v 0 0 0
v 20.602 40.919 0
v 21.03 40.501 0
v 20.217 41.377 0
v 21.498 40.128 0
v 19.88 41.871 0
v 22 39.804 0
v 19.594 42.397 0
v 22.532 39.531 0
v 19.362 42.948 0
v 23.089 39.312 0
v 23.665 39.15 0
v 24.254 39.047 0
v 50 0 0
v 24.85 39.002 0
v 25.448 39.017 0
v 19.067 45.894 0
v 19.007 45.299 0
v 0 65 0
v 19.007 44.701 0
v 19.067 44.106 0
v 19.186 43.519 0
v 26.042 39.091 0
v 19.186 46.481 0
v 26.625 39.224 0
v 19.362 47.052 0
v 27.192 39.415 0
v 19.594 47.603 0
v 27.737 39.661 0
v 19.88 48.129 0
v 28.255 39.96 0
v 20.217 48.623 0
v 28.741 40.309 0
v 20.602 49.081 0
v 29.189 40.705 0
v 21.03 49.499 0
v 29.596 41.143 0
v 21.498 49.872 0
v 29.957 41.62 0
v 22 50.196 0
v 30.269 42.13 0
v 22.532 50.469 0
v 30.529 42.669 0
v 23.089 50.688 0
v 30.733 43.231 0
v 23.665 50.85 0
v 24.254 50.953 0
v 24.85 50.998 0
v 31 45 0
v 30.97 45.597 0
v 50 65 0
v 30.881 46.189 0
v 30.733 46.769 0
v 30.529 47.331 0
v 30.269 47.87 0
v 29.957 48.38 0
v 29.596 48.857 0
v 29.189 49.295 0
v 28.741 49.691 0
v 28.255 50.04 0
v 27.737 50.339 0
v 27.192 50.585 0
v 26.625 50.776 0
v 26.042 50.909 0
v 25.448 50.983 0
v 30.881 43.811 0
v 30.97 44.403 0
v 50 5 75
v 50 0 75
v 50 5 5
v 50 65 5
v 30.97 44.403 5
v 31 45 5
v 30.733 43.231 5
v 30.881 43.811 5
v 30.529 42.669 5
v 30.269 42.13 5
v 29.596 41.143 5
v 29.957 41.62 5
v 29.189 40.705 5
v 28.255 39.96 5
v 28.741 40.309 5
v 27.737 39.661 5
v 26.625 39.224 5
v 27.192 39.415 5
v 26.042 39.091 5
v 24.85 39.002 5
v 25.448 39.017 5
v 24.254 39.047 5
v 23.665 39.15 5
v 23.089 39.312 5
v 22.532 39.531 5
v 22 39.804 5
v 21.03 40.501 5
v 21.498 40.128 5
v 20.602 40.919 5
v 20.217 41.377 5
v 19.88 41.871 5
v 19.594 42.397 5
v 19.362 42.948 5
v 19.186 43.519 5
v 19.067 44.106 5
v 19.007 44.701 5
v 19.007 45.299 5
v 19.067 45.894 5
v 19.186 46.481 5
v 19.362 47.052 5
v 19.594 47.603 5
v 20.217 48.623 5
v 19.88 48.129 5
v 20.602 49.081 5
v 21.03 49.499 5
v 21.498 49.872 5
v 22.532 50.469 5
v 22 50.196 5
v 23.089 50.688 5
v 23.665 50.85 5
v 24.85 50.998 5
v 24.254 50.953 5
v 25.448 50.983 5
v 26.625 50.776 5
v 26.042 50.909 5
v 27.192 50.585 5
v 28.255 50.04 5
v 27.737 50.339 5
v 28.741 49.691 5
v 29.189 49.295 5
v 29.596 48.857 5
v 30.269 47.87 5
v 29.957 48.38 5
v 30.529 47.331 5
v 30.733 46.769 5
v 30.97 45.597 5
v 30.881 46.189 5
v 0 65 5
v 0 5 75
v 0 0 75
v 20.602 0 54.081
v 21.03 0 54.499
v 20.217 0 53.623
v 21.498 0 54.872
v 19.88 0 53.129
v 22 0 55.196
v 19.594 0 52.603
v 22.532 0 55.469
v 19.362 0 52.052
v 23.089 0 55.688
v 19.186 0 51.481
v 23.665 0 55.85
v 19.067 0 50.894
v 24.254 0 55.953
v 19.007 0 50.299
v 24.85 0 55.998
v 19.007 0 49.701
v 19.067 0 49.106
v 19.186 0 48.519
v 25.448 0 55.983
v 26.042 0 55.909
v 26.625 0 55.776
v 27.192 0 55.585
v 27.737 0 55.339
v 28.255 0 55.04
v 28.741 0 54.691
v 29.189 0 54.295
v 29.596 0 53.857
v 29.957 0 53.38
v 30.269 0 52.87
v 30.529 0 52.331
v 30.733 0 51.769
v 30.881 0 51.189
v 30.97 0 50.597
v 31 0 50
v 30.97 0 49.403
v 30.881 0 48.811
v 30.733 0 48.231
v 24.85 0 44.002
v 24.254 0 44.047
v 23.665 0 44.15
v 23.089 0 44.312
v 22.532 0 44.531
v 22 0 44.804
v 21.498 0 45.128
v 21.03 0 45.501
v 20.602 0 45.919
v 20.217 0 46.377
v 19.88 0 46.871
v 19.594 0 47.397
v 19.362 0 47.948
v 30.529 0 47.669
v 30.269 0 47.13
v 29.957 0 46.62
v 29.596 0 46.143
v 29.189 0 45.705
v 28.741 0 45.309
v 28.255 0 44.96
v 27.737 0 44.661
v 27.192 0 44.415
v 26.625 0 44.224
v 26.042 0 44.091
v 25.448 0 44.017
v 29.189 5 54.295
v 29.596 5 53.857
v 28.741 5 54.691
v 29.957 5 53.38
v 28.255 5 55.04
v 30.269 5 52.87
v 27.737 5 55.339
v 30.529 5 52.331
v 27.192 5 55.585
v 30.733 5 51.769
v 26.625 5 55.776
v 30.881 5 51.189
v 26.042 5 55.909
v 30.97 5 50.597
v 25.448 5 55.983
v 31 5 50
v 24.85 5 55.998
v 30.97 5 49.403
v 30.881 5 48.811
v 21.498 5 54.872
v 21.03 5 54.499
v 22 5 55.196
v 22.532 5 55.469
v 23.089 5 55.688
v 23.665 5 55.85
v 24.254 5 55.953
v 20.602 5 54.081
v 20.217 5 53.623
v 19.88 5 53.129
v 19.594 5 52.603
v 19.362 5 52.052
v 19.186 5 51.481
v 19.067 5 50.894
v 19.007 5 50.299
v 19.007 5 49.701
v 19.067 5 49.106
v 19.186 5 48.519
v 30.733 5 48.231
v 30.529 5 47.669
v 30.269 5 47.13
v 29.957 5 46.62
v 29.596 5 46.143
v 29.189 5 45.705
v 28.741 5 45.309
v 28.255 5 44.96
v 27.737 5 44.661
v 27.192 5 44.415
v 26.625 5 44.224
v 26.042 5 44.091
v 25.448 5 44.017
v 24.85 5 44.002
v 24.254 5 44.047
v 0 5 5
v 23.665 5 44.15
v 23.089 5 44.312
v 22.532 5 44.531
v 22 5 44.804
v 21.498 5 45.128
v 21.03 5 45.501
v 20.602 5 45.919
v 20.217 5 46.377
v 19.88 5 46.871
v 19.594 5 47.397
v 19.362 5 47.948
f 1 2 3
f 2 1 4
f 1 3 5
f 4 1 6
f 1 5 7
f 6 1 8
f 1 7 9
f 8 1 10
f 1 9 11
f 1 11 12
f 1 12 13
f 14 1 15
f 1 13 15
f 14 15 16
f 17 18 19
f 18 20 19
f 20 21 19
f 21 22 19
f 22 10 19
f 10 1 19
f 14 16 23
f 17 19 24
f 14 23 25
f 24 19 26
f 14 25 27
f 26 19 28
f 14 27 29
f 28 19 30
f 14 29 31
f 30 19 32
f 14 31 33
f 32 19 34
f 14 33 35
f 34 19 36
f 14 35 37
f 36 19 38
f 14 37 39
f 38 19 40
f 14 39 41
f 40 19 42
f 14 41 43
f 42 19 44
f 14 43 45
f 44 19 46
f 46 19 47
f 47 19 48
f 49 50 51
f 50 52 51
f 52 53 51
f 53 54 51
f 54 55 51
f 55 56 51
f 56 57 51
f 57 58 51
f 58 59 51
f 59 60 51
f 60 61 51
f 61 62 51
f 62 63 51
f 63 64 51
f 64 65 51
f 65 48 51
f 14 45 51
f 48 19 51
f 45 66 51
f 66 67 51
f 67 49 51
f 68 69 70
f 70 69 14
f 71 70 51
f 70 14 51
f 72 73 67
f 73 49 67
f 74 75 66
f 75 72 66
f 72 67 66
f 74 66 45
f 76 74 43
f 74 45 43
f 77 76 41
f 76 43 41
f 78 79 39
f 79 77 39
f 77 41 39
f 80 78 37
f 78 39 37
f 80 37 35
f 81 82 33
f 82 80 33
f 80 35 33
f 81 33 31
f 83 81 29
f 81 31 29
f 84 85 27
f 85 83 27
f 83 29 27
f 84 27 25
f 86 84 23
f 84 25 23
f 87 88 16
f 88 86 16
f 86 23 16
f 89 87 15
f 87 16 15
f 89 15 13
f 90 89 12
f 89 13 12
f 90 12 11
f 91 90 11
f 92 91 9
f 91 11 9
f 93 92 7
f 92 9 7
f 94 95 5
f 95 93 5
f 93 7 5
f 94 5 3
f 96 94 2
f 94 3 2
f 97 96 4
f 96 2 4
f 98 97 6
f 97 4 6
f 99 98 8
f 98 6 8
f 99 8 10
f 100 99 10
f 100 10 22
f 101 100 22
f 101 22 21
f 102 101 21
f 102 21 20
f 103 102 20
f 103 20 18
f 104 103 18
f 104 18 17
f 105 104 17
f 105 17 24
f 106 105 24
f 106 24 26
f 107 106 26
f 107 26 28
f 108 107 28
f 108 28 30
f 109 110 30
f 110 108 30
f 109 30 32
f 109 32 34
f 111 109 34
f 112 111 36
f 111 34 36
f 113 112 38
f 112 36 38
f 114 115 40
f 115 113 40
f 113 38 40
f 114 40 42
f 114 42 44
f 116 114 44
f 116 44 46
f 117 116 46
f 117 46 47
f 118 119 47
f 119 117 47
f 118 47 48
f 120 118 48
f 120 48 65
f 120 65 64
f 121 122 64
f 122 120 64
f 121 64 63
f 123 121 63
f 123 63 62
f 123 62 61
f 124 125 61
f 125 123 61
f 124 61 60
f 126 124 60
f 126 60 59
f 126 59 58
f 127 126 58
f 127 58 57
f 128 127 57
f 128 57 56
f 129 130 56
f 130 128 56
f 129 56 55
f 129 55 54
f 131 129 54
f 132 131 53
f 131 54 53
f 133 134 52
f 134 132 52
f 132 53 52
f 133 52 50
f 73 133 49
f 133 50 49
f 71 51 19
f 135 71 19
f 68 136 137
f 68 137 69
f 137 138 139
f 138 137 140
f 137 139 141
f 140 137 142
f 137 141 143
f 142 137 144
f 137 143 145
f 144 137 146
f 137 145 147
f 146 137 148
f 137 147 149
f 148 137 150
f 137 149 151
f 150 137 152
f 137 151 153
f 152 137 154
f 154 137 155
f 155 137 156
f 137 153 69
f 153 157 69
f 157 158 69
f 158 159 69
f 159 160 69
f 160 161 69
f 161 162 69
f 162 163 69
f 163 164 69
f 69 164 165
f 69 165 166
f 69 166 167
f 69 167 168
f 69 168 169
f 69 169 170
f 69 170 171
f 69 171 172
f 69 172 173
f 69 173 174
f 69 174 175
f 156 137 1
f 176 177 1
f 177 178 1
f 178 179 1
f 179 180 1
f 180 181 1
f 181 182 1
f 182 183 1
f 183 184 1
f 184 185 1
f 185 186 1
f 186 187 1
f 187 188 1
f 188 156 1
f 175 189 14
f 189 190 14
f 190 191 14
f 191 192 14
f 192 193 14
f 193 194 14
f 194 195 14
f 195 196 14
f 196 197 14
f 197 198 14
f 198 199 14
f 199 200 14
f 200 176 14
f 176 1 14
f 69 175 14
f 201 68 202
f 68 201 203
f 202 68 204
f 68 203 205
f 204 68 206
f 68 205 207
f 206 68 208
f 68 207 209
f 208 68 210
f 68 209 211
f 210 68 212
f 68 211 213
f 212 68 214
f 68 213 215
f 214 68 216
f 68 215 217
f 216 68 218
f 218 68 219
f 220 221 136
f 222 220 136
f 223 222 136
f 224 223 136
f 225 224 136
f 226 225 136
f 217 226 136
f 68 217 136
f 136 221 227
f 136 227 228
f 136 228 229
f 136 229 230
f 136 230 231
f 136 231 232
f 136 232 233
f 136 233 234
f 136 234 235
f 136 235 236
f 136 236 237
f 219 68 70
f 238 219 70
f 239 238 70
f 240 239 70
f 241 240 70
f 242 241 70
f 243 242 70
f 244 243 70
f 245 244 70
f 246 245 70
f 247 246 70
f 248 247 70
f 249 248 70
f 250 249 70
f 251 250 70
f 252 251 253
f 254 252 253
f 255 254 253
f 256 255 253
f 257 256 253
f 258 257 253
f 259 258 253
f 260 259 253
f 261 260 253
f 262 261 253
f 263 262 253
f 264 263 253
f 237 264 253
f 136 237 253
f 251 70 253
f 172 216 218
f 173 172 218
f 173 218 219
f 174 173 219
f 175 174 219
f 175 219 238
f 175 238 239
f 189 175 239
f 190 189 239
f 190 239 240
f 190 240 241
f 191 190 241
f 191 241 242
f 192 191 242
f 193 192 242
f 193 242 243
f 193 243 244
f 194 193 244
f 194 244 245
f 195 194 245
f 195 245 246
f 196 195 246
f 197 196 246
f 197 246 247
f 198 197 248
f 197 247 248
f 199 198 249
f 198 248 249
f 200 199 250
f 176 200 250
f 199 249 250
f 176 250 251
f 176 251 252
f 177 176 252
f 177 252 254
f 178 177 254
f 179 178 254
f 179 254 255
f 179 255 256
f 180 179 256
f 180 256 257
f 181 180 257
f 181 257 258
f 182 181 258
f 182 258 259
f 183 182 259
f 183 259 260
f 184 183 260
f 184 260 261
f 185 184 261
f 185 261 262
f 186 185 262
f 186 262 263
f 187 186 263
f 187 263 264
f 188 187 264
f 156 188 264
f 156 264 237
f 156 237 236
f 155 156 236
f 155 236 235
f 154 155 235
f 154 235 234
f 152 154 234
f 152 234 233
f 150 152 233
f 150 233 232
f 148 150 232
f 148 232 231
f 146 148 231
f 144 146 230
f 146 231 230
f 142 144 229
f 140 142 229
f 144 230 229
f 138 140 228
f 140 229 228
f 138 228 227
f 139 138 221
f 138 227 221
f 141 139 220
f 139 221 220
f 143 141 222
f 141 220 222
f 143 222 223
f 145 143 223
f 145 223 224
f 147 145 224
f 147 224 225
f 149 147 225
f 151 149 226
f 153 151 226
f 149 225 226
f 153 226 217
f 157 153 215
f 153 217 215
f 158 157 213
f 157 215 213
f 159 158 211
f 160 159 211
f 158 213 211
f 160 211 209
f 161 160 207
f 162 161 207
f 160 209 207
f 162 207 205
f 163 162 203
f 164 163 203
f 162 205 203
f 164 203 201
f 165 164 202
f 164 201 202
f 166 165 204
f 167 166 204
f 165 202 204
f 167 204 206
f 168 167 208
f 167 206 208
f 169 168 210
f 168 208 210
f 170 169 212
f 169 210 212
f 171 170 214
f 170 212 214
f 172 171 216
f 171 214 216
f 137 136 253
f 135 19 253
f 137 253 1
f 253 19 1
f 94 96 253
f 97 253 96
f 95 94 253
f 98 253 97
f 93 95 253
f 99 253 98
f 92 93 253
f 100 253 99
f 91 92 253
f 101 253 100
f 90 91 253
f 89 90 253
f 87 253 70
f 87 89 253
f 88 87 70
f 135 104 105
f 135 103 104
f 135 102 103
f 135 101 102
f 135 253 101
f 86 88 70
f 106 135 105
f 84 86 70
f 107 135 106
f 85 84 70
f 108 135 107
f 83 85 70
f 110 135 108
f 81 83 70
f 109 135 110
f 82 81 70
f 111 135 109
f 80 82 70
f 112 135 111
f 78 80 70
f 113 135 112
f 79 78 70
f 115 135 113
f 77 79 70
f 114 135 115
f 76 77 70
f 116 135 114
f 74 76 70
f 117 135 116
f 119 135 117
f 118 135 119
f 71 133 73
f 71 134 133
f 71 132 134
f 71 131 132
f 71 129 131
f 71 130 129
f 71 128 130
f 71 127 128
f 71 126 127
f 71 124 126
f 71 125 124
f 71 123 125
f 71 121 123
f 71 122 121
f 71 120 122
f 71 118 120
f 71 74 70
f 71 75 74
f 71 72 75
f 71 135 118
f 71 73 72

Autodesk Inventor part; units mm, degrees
ref_plane "YZ Plane" through (0, 0, 0) normal (1, 0, 0) x (0, 1, 0)
ref_plane "XZ Plane" through (0, 0, 0) normal (0, 1, 0) x (-1, 0, 0)
ref_plane "XY Plane" through (0, 0, 0) normal (0, 0, 1) x (1, 0, 0)
sketch "Esboço1" plane through (0, 0, 0) normal (0, 0, 1) x (1, 0, 0)
  line L0 (0, 0) -> (50, 0)
  line L1 (50, 0) -> (50, 65)
  line L2 (50, 65) -> (0, 65)
  line L3 (0, 65) -> (0, 0)
  circle A0 centre (25, 45) radius 6
  dimension "d0" = 50
  dimension "d1" = 65
  dimension "d2" = 12
  dimension "d8" = 45
  dimension "d14" = 25
extrude "Extrusão1" add sketch "Esboço1" along normal blind 5
sketch "Esboço2" plane through (0, 0, 5) normal (0, 0, 1) x (1, 0, 0)
  line L0 (50, 0) -> (50, 65) projected
  line L1 (0, 0) -> (50, 0)
  line L2 (50, 0) -> (50, 5)
  line L3 (50, 5) -> (0, 5)
  line L4 (0, 5) -> (0, 0)
  dimension "d5" = 5
extrude "Extrusão2" add sketch "Esboço2" along normal blind 70
sketch "Esboço3" plane through (0, 5, 5) normal (0, 1, 0) x (1, 0, 0)
  circle A0 centre (25, -45) radius 6
  line L0 (50, -70) -> (0, -70) projected
  line L1 (50, 0) -> (50, -70) projected
  point P0 (0, 5)
  dimension "d9" = 12
  dimension "d10" = 25
  dimension "d11" = 25
extrude "Extrusão3" cut sketch "Esboço3" against normal blind 40
properties part number "Teste Suporte"
